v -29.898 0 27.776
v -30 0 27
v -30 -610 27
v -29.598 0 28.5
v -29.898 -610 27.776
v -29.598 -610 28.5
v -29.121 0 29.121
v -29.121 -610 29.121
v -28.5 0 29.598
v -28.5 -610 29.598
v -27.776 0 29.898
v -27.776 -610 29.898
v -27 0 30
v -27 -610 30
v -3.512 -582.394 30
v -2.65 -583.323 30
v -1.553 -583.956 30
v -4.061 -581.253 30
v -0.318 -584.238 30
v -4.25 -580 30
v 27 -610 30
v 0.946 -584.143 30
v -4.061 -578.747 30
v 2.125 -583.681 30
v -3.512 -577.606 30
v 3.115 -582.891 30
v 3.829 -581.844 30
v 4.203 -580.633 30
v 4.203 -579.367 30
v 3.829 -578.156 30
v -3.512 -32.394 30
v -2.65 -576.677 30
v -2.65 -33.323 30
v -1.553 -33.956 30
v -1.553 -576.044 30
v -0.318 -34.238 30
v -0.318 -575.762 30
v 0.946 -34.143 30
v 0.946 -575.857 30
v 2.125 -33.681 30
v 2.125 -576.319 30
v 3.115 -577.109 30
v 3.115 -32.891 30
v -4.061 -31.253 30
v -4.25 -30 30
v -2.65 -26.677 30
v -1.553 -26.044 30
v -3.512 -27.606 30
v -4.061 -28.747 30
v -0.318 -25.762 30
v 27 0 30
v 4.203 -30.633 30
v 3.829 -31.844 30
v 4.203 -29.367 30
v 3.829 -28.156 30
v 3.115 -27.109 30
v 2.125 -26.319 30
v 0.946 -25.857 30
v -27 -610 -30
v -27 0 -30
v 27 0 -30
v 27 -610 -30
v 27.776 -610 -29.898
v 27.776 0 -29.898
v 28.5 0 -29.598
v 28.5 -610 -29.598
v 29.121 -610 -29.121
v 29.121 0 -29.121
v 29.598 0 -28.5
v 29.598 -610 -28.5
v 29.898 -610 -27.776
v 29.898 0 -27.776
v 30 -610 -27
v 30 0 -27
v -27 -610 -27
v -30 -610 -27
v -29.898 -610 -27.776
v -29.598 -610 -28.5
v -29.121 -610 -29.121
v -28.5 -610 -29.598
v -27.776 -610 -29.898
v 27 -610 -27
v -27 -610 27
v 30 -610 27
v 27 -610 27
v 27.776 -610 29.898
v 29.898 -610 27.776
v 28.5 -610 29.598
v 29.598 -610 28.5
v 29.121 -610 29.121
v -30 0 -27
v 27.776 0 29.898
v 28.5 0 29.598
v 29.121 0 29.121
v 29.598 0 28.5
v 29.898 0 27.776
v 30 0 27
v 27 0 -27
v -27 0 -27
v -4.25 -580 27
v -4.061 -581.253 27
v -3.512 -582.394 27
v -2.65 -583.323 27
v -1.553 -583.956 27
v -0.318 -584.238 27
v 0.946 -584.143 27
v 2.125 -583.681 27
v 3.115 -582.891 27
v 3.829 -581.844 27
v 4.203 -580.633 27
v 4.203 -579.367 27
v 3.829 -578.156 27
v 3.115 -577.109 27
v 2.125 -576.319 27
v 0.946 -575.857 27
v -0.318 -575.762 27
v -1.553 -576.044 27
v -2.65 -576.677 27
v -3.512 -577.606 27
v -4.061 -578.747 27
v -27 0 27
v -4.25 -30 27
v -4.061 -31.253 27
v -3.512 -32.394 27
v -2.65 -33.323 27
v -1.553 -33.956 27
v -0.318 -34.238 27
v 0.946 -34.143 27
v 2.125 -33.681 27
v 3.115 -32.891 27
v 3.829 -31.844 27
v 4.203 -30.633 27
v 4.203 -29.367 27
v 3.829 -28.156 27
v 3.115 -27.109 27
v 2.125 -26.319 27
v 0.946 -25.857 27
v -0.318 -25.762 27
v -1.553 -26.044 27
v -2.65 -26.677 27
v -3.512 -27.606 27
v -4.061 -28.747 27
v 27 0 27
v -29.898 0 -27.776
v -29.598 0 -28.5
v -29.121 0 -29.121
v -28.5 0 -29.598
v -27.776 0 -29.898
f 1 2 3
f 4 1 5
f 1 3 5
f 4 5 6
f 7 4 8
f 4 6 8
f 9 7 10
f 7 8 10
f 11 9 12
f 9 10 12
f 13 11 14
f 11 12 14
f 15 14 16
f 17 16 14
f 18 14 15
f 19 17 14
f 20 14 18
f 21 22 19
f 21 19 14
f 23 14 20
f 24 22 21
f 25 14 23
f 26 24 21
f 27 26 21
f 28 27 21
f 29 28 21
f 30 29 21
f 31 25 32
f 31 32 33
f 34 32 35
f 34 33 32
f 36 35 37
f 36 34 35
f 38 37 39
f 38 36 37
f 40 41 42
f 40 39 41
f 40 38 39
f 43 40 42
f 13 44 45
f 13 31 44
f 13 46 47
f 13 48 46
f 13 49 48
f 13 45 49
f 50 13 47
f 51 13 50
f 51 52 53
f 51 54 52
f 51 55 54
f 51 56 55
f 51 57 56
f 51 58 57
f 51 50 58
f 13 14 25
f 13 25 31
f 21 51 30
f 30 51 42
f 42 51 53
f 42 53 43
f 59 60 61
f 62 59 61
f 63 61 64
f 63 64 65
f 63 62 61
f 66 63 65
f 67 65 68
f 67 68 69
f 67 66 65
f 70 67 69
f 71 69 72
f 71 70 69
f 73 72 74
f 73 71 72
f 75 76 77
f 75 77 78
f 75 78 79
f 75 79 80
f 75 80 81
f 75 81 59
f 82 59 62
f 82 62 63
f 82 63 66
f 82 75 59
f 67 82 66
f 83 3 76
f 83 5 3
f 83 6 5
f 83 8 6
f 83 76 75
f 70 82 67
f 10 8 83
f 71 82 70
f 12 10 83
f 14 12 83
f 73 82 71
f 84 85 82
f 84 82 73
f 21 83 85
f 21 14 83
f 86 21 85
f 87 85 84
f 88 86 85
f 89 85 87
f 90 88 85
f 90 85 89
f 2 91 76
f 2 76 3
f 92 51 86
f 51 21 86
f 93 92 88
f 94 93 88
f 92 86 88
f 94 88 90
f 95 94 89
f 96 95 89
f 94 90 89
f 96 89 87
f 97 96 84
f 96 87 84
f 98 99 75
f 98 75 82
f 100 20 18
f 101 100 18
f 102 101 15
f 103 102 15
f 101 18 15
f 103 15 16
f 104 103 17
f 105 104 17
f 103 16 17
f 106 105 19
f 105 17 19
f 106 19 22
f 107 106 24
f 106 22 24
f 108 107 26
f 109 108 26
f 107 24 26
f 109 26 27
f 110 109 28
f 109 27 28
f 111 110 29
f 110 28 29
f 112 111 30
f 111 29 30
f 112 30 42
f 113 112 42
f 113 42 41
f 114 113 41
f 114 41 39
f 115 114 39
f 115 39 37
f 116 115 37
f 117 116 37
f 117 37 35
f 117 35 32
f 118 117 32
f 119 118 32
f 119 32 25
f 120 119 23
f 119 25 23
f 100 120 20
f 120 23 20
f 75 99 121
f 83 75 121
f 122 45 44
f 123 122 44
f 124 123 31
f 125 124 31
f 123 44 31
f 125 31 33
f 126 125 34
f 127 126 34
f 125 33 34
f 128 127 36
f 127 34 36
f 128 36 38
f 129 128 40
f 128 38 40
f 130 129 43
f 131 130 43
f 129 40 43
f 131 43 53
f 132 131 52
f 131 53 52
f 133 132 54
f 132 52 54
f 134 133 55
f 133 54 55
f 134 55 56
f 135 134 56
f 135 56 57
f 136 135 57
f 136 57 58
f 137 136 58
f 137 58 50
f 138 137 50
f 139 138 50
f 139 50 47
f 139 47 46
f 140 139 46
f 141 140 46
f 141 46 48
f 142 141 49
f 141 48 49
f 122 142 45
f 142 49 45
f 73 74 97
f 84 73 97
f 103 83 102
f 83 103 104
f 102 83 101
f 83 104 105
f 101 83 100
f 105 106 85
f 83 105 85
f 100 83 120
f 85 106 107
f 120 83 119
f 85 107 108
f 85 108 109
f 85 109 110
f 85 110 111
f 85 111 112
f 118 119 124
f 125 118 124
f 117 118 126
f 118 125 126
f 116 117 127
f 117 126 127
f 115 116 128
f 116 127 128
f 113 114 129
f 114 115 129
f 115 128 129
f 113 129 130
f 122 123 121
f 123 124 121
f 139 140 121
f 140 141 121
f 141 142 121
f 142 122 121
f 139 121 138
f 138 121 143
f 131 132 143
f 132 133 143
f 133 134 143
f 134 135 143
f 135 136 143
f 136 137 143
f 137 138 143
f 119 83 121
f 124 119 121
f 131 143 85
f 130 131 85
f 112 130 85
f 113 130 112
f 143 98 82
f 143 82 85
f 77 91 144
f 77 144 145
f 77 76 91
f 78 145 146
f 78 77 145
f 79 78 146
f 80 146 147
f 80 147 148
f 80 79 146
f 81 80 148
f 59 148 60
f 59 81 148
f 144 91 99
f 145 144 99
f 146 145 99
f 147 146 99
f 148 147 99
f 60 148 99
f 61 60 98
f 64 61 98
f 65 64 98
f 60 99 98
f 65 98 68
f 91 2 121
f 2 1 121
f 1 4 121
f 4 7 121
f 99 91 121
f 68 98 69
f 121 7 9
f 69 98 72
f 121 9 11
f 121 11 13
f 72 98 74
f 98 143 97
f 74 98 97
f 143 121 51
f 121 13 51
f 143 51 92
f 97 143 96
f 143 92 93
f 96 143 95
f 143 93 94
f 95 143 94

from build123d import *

# Parameters (mm, degrees)
SKETCH_W     = 60
SKETCH_H     = 60
SKETCH_W_2   = 54
SKETCH_H_2   = 54
PAD_DEPTH    = 610
SKETCH001_R  = 4.25
POCKET_DEPTH = 3
FILLET_R     = 3


with BuildPart() as part:
    # Sketch → Pad (new body)
    with BuildSketch(Plane.XZ):
        Rectangle(SKETCH_W, SKETCH_H)
        Rectangle(SKETCH_W_2, SKETCH_H_2, mode=Mode.SUBTRACT)
    extrude(amount=PAD_DEPTH)

    # Sketch001 (on Face1 of Pad) → Pocket (cut)
    with BuildSketch(Plane(origin=(0, 0, 30), x_dir=(-1, 0, 0), z_dir=(0, 0, 1))):
        with Locations((0, 30)):
            Circle(SKETCH001_R)
        with Locations((0, 580)):
            Circle(SKETCH001_R)
    extrude(amount=-POCKET_DEPTH, mode=Mode.SUBTRACT)

    # Fillet
    fillet_edges = [part.edges().sort_by_distance(p)[0] for p in [
        (30, -305, 30),
        (30, -305, -30),
        (-30, -305, 30),
        (-30, -305, -30),
    ]]
    fillet(fillet_edges, radius=FILLET_R)


solid = part.part
